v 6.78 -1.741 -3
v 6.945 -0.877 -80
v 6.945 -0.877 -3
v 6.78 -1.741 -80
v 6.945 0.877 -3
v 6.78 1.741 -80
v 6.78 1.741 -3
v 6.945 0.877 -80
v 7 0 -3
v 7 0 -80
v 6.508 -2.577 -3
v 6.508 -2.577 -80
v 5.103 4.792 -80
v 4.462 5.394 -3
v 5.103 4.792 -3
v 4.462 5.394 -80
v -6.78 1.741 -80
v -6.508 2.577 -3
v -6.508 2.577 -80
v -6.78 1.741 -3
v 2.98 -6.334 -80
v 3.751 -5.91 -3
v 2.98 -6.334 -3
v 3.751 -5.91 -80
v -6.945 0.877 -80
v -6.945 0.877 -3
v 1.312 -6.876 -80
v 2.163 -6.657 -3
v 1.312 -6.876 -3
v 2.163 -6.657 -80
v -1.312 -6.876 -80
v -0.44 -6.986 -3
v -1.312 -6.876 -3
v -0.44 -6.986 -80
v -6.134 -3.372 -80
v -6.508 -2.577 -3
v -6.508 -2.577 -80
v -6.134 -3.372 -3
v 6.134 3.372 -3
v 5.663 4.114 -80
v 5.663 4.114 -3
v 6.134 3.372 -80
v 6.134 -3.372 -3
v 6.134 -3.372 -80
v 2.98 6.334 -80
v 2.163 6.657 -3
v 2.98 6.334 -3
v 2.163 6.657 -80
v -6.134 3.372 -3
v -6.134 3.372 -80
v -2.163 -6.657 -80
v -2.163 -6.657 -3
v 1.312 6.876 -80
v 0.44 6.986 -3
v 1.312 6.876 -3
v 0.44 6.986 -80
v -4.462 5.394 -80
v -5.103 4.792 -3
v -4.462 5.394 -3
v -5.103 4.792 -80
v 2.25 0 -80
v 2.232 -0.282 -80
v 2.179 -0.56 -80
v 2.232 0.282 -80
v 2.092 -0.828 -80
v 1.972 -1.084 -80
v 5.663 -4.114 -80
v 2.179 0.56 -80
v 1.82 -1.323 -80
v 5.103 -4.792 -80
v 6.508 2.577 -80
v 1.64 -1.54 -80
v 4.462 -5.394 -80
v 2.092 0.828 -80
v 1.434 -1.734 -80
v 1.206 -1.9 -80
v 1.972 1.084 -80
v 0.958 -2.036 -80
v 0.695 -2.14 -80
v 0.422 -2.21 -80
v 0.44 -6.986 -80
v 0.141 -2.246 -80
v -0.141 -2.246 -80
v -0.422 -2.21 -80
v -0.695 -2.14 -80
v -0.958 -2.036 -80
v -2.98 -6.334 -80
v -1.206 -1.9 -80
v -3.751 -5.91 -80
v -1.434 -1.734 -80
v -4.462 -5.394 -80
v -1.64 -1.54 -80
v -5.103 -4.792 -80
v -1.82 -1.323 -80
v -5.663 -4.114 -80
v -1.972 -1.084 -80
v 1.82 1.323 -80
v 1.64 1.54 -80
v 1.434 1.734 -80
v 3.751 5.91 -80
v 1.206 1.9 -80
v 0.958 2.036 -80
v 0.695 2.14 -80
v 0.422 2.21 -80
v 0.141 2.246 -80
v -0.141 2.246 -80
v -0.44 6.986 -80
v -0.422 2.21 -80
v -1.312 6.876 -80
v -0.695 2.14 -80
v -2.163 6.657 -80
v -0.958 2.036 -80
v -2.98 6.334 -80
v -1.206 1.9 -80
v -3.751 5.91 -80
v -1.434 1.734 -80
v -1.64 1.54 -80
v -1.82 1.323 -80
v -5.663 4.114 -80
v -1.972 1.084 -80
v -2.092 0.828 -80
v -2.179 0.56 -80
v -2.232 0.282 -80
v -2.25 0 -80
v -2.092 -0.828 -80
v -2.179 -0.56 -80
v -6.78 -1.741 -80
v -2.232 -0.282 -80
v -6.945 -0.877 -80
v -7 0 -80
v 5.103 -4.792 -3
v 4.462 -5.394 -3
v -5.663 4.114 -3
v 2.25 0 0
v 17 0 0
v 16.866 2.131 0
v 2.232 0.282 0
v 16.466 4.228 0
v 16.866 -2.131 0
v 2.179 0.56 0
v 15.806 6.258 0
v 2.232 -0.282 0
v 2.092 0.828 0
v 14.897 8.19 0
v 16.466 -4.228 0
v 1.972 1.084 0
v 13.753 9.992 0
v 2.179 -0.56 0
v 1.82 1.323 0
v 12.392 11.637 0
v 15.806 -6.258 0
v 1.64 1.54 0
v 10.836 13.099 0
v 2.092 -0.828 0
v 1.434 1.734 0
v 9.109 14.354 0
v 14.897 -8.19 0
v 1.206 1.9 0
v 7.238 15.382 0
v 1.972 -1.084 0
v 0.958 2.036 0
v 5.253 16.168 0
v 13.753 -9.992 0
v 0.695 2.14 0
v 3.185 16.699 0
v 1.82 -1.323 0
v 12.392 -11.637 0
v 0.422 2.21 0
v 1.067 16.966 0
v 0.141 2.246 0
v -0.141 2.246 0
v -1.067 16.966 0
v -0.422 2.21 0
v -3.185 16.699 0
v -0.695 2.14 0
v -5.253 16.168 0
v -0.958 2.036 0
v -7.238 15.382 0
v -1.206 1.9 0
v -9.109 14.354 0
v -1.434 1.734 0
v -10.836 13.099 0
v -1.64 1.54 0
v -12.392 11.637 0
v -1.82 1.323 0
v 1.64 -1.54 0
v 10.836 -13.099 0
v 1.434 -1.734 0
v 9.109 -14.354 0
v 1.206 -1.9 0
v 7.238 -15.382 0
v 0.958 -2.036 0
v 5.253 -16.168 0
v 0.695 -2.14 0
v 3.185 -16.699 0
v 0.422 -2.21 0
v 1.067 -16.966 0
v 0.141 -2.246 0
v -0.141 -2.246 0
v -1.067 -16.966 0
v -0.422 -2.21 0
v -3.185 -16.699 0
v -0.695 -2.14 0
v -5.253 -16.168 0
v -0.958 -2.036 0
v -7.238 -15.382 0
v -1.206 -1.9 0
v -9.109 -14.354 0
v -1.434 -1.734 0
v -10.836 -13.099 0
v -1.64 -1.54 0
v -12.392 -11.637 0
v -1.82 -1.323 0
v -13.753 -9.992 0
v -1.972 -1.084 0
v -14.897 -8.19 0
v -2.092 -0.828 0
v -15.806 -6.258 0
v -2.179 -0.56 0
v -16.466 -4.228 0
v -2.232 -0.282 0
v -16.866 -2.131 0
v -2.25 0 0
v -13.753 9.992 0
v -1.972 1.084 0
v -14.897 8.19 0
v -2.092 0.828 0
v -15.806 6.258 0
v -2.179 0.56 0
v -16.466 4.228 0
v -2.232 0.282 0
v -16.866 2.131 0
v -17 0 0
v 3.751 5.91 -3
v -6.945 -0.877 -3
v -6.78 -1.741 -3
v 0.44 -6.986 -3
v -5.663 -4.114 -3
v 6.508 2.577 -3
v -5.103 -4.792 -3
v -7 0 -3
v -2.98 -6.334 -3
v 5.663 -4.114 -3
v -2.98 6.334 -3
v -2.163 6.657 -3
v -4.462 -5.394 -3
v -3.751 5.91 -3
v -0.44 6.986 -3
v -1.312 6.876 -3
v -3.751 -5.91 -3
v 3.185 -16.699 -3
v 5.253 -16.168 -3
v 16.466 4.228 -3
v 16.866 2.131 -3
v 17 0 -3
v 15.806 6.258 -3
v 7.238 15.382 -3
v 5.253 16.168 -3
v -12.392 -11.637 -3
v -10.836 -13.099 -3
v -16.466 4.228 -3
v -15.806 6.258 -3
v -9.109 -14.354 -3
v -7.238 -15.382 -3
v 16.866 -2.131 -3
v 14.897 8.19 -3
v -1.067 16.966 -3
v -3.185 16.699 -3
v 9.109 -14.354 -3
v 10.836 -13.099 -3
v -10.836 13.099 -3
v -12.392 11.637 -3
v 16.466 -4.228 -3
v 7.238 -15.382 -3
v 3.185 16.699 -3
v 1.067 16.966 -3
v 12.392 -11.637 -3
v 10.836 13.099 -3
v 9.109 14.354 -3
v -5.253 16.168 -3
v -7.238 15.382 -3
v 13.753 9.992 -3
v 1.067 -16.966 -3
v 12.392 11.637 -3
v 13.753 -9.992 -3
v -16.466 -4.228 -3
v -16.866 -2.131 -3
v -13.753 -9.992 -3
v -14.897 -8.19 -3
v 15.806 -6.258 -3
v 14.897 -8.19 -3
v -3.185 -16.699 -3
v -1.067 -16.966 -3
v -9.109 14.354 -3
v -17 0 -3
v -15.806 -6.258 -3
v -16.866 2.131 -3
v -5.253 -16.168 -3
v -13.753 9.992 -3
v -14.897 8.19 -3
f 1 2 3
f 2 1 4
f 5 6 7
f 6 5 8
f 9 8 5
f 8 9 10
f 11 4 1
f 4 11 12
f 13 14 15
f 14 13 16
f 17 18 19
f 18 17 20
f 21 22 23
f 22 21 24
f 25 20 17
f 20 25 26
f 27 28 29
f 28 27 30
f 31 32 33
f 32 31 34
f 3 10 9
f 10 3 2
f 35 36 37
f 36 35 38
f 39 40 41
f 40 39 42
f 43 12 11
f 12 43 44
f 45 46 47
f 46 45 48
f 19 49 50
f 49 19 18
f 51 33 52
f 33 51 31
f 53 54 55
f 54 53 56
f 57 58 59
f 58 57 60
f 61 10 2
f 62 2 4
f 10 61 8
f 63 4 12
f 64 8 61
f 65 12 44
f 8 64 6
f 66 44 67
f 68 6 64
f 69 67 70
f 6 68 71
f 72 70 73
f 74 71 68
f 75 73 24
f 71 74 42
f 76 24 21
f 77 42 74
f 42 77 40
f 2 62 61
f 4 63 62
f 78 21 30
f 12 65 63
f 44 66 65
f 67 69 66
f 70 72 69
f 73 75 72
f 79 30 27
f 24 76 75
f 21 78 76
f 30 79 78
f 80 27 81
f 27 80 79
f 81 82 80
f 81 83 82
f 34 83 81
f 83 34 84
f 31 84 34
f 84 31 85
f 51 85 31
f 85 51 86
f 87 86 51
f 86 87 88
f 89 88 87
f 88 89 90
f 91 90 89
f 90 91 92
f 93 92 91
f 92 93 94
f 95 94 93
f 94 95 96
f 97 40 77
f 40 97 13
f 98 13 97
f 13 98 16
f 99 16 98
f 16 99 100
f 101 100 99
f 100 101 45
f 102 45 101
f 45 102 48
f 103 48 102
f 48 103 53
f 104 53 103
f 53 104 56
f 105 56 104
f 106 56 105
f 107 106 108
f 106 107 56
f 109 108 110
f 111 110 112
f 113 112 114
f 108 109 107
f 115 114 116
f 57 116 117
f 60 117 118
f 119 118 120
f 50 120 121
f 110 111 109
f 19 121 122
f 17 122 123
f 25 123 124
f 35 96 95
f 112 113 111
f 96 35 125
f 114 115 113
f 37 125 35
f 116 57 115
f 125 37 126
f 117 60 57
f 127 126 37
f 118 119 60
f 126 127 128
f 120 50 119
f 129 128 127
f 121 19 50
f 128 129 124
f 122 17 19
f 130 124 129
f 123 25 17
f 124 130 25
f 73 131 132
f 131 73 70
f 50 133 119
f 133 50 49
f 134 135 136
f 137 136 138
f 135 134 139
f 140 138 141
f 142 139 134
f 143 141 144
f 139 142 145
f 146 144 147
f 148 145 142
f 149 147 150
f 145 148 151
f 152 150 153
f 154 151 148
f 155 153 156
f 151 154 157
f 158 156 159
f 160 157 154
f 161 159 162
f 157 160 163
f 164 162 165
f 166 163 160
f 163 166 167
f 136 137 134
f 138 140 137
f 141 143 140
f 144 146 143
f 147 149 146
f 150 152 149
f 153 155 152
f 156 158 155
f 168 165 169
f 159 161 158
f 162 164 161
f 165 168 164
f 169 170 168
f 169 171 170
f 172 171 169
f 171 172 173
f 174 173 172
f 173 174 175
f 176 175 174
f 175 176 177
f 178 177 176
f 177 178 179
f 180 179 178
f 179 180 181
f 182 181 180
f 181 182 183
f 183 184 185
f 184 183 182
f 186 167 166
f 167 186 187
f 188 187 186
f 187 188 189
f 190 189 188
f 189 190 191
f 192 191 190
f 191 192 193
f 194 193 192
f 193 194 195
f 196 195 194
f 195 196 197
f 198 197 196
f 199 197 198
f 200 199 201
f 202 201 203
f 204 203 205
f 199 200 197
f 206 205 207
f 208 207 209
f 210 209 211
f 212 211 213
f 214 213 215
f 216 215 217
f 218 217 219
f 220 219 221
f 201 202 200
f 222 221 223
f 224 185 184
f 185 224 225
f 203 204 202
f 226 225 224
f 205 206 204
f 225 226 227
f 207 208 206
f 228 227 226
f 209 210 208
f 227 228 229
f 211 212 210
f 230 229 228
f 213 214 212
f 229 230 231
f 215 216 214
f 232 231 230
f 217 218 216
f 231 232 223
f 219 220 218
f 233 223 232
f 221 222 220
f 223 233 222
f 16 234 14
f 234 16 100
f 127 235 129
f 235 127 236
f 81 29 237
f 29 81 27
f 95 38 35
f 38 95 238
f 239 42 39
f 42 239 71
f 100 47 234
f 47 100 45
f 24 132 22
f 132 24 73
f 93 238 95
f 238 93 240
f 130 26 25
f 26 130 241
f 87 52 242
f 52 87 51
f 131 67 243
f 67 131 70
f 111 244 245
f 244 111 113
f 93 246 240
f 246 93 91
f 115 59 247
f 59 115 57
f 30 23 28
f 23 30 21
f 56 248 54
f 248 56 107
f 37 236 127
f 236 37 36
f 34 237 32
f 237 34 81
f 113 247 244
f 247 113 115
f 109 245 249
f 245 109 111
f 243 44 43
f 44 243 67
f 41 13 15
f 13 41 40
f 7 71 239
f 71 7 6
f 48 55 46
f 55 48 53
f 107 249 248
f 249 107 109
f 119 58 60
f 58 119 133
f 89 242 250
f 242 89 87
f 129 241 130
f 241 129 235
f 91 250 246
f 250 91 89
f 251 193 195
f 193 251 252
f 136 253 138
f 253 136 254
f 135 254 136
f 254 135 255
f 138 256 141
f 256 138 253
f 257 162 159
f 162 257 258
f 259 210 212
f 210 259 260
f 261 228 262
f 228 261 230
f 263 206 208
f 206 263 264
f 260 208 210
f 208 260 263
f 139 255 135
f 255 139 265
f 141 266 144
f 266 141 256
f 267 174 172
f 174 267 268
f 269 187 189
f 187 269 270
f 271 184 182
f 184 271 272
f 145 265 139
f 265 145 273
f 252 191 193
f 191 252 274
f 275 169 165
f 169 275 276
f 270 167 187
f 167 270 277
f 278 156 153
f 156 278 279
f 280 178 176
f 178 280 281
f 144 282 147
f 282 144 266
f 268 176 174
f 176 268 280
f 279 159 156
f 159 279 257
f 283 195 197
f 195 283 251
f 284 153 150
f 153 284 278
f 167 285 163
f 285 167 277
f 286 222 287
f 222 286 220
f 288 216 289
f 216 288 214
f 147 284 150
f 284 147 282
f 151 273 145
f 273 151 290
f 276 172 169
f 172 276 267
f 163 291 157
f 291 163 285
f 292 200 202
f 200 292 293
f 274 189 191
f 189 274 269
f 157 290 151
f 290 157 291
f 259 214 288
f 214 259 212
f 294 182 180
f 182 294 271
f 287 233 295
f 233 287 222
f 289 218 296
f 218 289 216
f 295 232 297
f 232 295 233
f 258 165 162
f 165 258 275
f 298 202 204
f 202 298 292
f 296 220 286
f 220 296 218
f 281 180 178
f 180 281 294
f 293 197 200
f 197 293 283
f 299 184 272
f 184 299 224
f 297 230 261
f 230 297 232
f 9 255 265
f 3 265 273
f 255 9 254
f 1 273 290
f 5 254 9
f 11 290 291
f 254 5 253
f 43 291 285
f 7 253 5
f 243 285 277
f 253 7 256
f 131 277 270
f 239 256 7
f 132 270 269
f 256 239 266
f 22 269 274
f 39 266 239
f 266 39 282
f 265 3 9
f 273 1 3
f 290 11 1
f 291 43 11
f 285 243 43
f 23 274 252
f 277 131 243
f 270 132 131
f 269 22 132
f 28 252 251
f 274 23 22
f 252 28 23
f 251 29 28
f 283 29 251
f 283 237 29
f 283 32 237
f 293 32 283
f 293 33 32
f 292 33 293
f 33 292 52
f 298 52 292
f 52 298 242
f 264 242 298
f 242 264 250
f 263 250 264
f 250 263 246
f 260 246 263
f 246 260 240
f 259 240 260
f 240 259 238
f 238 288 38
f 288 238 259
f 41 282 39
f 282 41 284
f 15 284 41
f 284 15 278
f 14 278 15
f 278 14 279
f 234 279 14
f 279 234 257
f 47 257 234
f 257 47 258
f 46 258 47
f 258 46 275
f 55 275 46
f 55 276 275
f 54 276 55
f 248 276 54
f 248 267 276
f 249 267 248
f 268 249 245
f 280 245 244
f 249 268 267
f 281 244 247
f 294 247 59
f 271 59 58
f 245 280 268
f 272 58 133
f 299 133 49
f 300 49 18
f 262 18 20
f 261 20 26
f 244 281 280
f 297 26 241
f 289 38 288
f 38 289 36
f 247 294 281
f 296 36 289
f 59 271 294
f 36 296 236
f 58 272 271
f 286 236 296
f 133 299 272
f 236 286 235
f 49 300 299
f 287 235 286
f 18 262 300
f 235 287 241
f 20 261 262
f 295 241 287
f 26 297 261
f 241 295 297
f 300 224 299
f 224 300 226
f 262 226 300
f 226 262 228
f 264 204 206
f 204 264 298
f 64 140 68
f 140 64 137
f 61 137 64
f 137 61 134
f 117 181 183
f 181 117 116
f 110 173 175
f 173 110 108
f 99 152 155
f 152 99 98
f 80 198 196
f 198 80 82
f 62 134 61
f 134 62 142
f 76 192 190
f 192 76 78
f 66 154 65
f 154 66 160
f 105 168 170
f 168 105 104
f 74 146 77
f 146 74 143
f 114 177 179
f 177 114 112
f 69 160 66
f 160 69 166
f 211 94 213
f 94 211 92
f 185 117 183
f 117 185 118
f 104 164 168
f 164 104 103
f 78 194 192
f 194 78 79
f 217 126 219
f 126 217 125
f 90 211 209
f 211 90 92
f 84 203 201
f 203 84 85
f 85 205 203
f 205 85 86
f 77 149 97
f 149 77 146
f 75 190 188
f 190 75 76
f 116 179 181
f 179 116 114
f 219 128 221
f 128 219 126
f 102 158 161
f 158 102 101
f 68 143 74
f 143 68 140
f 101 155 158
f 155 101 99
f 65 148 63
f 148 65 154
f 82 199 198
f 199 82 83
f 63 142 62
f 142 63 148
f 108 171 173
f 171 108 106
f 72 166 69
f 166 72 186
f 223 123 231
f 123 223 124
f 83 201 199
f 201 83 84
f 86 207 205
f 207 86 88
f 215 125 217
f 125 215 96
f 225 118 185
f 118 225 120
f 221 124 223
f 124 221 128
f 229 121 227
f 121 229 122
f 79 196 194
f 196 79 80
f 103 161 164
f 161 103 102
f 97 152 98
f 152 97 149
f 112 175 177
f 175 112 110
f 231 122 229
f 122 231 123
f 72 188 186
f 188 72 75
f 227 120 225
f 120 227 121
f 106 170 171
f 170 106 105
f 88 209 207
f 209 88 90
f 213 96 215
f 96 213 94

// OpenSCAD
$fn = 50;


difference() {
	union() {
		translate(v = [0, 0, -80.0000000000]) {
			cylinder(h = 80, r = 7.0000000000);
		}
		translate(v = [0, 0, -3.0000000000]) {
			cylinder(h = 3, r = 17.0000000000);
		}
	}
	union() {
		#translate(v = [0, 0, -80]) {
			cylinder(h = 80, r = 2.2500000000);
		}
	}
}
